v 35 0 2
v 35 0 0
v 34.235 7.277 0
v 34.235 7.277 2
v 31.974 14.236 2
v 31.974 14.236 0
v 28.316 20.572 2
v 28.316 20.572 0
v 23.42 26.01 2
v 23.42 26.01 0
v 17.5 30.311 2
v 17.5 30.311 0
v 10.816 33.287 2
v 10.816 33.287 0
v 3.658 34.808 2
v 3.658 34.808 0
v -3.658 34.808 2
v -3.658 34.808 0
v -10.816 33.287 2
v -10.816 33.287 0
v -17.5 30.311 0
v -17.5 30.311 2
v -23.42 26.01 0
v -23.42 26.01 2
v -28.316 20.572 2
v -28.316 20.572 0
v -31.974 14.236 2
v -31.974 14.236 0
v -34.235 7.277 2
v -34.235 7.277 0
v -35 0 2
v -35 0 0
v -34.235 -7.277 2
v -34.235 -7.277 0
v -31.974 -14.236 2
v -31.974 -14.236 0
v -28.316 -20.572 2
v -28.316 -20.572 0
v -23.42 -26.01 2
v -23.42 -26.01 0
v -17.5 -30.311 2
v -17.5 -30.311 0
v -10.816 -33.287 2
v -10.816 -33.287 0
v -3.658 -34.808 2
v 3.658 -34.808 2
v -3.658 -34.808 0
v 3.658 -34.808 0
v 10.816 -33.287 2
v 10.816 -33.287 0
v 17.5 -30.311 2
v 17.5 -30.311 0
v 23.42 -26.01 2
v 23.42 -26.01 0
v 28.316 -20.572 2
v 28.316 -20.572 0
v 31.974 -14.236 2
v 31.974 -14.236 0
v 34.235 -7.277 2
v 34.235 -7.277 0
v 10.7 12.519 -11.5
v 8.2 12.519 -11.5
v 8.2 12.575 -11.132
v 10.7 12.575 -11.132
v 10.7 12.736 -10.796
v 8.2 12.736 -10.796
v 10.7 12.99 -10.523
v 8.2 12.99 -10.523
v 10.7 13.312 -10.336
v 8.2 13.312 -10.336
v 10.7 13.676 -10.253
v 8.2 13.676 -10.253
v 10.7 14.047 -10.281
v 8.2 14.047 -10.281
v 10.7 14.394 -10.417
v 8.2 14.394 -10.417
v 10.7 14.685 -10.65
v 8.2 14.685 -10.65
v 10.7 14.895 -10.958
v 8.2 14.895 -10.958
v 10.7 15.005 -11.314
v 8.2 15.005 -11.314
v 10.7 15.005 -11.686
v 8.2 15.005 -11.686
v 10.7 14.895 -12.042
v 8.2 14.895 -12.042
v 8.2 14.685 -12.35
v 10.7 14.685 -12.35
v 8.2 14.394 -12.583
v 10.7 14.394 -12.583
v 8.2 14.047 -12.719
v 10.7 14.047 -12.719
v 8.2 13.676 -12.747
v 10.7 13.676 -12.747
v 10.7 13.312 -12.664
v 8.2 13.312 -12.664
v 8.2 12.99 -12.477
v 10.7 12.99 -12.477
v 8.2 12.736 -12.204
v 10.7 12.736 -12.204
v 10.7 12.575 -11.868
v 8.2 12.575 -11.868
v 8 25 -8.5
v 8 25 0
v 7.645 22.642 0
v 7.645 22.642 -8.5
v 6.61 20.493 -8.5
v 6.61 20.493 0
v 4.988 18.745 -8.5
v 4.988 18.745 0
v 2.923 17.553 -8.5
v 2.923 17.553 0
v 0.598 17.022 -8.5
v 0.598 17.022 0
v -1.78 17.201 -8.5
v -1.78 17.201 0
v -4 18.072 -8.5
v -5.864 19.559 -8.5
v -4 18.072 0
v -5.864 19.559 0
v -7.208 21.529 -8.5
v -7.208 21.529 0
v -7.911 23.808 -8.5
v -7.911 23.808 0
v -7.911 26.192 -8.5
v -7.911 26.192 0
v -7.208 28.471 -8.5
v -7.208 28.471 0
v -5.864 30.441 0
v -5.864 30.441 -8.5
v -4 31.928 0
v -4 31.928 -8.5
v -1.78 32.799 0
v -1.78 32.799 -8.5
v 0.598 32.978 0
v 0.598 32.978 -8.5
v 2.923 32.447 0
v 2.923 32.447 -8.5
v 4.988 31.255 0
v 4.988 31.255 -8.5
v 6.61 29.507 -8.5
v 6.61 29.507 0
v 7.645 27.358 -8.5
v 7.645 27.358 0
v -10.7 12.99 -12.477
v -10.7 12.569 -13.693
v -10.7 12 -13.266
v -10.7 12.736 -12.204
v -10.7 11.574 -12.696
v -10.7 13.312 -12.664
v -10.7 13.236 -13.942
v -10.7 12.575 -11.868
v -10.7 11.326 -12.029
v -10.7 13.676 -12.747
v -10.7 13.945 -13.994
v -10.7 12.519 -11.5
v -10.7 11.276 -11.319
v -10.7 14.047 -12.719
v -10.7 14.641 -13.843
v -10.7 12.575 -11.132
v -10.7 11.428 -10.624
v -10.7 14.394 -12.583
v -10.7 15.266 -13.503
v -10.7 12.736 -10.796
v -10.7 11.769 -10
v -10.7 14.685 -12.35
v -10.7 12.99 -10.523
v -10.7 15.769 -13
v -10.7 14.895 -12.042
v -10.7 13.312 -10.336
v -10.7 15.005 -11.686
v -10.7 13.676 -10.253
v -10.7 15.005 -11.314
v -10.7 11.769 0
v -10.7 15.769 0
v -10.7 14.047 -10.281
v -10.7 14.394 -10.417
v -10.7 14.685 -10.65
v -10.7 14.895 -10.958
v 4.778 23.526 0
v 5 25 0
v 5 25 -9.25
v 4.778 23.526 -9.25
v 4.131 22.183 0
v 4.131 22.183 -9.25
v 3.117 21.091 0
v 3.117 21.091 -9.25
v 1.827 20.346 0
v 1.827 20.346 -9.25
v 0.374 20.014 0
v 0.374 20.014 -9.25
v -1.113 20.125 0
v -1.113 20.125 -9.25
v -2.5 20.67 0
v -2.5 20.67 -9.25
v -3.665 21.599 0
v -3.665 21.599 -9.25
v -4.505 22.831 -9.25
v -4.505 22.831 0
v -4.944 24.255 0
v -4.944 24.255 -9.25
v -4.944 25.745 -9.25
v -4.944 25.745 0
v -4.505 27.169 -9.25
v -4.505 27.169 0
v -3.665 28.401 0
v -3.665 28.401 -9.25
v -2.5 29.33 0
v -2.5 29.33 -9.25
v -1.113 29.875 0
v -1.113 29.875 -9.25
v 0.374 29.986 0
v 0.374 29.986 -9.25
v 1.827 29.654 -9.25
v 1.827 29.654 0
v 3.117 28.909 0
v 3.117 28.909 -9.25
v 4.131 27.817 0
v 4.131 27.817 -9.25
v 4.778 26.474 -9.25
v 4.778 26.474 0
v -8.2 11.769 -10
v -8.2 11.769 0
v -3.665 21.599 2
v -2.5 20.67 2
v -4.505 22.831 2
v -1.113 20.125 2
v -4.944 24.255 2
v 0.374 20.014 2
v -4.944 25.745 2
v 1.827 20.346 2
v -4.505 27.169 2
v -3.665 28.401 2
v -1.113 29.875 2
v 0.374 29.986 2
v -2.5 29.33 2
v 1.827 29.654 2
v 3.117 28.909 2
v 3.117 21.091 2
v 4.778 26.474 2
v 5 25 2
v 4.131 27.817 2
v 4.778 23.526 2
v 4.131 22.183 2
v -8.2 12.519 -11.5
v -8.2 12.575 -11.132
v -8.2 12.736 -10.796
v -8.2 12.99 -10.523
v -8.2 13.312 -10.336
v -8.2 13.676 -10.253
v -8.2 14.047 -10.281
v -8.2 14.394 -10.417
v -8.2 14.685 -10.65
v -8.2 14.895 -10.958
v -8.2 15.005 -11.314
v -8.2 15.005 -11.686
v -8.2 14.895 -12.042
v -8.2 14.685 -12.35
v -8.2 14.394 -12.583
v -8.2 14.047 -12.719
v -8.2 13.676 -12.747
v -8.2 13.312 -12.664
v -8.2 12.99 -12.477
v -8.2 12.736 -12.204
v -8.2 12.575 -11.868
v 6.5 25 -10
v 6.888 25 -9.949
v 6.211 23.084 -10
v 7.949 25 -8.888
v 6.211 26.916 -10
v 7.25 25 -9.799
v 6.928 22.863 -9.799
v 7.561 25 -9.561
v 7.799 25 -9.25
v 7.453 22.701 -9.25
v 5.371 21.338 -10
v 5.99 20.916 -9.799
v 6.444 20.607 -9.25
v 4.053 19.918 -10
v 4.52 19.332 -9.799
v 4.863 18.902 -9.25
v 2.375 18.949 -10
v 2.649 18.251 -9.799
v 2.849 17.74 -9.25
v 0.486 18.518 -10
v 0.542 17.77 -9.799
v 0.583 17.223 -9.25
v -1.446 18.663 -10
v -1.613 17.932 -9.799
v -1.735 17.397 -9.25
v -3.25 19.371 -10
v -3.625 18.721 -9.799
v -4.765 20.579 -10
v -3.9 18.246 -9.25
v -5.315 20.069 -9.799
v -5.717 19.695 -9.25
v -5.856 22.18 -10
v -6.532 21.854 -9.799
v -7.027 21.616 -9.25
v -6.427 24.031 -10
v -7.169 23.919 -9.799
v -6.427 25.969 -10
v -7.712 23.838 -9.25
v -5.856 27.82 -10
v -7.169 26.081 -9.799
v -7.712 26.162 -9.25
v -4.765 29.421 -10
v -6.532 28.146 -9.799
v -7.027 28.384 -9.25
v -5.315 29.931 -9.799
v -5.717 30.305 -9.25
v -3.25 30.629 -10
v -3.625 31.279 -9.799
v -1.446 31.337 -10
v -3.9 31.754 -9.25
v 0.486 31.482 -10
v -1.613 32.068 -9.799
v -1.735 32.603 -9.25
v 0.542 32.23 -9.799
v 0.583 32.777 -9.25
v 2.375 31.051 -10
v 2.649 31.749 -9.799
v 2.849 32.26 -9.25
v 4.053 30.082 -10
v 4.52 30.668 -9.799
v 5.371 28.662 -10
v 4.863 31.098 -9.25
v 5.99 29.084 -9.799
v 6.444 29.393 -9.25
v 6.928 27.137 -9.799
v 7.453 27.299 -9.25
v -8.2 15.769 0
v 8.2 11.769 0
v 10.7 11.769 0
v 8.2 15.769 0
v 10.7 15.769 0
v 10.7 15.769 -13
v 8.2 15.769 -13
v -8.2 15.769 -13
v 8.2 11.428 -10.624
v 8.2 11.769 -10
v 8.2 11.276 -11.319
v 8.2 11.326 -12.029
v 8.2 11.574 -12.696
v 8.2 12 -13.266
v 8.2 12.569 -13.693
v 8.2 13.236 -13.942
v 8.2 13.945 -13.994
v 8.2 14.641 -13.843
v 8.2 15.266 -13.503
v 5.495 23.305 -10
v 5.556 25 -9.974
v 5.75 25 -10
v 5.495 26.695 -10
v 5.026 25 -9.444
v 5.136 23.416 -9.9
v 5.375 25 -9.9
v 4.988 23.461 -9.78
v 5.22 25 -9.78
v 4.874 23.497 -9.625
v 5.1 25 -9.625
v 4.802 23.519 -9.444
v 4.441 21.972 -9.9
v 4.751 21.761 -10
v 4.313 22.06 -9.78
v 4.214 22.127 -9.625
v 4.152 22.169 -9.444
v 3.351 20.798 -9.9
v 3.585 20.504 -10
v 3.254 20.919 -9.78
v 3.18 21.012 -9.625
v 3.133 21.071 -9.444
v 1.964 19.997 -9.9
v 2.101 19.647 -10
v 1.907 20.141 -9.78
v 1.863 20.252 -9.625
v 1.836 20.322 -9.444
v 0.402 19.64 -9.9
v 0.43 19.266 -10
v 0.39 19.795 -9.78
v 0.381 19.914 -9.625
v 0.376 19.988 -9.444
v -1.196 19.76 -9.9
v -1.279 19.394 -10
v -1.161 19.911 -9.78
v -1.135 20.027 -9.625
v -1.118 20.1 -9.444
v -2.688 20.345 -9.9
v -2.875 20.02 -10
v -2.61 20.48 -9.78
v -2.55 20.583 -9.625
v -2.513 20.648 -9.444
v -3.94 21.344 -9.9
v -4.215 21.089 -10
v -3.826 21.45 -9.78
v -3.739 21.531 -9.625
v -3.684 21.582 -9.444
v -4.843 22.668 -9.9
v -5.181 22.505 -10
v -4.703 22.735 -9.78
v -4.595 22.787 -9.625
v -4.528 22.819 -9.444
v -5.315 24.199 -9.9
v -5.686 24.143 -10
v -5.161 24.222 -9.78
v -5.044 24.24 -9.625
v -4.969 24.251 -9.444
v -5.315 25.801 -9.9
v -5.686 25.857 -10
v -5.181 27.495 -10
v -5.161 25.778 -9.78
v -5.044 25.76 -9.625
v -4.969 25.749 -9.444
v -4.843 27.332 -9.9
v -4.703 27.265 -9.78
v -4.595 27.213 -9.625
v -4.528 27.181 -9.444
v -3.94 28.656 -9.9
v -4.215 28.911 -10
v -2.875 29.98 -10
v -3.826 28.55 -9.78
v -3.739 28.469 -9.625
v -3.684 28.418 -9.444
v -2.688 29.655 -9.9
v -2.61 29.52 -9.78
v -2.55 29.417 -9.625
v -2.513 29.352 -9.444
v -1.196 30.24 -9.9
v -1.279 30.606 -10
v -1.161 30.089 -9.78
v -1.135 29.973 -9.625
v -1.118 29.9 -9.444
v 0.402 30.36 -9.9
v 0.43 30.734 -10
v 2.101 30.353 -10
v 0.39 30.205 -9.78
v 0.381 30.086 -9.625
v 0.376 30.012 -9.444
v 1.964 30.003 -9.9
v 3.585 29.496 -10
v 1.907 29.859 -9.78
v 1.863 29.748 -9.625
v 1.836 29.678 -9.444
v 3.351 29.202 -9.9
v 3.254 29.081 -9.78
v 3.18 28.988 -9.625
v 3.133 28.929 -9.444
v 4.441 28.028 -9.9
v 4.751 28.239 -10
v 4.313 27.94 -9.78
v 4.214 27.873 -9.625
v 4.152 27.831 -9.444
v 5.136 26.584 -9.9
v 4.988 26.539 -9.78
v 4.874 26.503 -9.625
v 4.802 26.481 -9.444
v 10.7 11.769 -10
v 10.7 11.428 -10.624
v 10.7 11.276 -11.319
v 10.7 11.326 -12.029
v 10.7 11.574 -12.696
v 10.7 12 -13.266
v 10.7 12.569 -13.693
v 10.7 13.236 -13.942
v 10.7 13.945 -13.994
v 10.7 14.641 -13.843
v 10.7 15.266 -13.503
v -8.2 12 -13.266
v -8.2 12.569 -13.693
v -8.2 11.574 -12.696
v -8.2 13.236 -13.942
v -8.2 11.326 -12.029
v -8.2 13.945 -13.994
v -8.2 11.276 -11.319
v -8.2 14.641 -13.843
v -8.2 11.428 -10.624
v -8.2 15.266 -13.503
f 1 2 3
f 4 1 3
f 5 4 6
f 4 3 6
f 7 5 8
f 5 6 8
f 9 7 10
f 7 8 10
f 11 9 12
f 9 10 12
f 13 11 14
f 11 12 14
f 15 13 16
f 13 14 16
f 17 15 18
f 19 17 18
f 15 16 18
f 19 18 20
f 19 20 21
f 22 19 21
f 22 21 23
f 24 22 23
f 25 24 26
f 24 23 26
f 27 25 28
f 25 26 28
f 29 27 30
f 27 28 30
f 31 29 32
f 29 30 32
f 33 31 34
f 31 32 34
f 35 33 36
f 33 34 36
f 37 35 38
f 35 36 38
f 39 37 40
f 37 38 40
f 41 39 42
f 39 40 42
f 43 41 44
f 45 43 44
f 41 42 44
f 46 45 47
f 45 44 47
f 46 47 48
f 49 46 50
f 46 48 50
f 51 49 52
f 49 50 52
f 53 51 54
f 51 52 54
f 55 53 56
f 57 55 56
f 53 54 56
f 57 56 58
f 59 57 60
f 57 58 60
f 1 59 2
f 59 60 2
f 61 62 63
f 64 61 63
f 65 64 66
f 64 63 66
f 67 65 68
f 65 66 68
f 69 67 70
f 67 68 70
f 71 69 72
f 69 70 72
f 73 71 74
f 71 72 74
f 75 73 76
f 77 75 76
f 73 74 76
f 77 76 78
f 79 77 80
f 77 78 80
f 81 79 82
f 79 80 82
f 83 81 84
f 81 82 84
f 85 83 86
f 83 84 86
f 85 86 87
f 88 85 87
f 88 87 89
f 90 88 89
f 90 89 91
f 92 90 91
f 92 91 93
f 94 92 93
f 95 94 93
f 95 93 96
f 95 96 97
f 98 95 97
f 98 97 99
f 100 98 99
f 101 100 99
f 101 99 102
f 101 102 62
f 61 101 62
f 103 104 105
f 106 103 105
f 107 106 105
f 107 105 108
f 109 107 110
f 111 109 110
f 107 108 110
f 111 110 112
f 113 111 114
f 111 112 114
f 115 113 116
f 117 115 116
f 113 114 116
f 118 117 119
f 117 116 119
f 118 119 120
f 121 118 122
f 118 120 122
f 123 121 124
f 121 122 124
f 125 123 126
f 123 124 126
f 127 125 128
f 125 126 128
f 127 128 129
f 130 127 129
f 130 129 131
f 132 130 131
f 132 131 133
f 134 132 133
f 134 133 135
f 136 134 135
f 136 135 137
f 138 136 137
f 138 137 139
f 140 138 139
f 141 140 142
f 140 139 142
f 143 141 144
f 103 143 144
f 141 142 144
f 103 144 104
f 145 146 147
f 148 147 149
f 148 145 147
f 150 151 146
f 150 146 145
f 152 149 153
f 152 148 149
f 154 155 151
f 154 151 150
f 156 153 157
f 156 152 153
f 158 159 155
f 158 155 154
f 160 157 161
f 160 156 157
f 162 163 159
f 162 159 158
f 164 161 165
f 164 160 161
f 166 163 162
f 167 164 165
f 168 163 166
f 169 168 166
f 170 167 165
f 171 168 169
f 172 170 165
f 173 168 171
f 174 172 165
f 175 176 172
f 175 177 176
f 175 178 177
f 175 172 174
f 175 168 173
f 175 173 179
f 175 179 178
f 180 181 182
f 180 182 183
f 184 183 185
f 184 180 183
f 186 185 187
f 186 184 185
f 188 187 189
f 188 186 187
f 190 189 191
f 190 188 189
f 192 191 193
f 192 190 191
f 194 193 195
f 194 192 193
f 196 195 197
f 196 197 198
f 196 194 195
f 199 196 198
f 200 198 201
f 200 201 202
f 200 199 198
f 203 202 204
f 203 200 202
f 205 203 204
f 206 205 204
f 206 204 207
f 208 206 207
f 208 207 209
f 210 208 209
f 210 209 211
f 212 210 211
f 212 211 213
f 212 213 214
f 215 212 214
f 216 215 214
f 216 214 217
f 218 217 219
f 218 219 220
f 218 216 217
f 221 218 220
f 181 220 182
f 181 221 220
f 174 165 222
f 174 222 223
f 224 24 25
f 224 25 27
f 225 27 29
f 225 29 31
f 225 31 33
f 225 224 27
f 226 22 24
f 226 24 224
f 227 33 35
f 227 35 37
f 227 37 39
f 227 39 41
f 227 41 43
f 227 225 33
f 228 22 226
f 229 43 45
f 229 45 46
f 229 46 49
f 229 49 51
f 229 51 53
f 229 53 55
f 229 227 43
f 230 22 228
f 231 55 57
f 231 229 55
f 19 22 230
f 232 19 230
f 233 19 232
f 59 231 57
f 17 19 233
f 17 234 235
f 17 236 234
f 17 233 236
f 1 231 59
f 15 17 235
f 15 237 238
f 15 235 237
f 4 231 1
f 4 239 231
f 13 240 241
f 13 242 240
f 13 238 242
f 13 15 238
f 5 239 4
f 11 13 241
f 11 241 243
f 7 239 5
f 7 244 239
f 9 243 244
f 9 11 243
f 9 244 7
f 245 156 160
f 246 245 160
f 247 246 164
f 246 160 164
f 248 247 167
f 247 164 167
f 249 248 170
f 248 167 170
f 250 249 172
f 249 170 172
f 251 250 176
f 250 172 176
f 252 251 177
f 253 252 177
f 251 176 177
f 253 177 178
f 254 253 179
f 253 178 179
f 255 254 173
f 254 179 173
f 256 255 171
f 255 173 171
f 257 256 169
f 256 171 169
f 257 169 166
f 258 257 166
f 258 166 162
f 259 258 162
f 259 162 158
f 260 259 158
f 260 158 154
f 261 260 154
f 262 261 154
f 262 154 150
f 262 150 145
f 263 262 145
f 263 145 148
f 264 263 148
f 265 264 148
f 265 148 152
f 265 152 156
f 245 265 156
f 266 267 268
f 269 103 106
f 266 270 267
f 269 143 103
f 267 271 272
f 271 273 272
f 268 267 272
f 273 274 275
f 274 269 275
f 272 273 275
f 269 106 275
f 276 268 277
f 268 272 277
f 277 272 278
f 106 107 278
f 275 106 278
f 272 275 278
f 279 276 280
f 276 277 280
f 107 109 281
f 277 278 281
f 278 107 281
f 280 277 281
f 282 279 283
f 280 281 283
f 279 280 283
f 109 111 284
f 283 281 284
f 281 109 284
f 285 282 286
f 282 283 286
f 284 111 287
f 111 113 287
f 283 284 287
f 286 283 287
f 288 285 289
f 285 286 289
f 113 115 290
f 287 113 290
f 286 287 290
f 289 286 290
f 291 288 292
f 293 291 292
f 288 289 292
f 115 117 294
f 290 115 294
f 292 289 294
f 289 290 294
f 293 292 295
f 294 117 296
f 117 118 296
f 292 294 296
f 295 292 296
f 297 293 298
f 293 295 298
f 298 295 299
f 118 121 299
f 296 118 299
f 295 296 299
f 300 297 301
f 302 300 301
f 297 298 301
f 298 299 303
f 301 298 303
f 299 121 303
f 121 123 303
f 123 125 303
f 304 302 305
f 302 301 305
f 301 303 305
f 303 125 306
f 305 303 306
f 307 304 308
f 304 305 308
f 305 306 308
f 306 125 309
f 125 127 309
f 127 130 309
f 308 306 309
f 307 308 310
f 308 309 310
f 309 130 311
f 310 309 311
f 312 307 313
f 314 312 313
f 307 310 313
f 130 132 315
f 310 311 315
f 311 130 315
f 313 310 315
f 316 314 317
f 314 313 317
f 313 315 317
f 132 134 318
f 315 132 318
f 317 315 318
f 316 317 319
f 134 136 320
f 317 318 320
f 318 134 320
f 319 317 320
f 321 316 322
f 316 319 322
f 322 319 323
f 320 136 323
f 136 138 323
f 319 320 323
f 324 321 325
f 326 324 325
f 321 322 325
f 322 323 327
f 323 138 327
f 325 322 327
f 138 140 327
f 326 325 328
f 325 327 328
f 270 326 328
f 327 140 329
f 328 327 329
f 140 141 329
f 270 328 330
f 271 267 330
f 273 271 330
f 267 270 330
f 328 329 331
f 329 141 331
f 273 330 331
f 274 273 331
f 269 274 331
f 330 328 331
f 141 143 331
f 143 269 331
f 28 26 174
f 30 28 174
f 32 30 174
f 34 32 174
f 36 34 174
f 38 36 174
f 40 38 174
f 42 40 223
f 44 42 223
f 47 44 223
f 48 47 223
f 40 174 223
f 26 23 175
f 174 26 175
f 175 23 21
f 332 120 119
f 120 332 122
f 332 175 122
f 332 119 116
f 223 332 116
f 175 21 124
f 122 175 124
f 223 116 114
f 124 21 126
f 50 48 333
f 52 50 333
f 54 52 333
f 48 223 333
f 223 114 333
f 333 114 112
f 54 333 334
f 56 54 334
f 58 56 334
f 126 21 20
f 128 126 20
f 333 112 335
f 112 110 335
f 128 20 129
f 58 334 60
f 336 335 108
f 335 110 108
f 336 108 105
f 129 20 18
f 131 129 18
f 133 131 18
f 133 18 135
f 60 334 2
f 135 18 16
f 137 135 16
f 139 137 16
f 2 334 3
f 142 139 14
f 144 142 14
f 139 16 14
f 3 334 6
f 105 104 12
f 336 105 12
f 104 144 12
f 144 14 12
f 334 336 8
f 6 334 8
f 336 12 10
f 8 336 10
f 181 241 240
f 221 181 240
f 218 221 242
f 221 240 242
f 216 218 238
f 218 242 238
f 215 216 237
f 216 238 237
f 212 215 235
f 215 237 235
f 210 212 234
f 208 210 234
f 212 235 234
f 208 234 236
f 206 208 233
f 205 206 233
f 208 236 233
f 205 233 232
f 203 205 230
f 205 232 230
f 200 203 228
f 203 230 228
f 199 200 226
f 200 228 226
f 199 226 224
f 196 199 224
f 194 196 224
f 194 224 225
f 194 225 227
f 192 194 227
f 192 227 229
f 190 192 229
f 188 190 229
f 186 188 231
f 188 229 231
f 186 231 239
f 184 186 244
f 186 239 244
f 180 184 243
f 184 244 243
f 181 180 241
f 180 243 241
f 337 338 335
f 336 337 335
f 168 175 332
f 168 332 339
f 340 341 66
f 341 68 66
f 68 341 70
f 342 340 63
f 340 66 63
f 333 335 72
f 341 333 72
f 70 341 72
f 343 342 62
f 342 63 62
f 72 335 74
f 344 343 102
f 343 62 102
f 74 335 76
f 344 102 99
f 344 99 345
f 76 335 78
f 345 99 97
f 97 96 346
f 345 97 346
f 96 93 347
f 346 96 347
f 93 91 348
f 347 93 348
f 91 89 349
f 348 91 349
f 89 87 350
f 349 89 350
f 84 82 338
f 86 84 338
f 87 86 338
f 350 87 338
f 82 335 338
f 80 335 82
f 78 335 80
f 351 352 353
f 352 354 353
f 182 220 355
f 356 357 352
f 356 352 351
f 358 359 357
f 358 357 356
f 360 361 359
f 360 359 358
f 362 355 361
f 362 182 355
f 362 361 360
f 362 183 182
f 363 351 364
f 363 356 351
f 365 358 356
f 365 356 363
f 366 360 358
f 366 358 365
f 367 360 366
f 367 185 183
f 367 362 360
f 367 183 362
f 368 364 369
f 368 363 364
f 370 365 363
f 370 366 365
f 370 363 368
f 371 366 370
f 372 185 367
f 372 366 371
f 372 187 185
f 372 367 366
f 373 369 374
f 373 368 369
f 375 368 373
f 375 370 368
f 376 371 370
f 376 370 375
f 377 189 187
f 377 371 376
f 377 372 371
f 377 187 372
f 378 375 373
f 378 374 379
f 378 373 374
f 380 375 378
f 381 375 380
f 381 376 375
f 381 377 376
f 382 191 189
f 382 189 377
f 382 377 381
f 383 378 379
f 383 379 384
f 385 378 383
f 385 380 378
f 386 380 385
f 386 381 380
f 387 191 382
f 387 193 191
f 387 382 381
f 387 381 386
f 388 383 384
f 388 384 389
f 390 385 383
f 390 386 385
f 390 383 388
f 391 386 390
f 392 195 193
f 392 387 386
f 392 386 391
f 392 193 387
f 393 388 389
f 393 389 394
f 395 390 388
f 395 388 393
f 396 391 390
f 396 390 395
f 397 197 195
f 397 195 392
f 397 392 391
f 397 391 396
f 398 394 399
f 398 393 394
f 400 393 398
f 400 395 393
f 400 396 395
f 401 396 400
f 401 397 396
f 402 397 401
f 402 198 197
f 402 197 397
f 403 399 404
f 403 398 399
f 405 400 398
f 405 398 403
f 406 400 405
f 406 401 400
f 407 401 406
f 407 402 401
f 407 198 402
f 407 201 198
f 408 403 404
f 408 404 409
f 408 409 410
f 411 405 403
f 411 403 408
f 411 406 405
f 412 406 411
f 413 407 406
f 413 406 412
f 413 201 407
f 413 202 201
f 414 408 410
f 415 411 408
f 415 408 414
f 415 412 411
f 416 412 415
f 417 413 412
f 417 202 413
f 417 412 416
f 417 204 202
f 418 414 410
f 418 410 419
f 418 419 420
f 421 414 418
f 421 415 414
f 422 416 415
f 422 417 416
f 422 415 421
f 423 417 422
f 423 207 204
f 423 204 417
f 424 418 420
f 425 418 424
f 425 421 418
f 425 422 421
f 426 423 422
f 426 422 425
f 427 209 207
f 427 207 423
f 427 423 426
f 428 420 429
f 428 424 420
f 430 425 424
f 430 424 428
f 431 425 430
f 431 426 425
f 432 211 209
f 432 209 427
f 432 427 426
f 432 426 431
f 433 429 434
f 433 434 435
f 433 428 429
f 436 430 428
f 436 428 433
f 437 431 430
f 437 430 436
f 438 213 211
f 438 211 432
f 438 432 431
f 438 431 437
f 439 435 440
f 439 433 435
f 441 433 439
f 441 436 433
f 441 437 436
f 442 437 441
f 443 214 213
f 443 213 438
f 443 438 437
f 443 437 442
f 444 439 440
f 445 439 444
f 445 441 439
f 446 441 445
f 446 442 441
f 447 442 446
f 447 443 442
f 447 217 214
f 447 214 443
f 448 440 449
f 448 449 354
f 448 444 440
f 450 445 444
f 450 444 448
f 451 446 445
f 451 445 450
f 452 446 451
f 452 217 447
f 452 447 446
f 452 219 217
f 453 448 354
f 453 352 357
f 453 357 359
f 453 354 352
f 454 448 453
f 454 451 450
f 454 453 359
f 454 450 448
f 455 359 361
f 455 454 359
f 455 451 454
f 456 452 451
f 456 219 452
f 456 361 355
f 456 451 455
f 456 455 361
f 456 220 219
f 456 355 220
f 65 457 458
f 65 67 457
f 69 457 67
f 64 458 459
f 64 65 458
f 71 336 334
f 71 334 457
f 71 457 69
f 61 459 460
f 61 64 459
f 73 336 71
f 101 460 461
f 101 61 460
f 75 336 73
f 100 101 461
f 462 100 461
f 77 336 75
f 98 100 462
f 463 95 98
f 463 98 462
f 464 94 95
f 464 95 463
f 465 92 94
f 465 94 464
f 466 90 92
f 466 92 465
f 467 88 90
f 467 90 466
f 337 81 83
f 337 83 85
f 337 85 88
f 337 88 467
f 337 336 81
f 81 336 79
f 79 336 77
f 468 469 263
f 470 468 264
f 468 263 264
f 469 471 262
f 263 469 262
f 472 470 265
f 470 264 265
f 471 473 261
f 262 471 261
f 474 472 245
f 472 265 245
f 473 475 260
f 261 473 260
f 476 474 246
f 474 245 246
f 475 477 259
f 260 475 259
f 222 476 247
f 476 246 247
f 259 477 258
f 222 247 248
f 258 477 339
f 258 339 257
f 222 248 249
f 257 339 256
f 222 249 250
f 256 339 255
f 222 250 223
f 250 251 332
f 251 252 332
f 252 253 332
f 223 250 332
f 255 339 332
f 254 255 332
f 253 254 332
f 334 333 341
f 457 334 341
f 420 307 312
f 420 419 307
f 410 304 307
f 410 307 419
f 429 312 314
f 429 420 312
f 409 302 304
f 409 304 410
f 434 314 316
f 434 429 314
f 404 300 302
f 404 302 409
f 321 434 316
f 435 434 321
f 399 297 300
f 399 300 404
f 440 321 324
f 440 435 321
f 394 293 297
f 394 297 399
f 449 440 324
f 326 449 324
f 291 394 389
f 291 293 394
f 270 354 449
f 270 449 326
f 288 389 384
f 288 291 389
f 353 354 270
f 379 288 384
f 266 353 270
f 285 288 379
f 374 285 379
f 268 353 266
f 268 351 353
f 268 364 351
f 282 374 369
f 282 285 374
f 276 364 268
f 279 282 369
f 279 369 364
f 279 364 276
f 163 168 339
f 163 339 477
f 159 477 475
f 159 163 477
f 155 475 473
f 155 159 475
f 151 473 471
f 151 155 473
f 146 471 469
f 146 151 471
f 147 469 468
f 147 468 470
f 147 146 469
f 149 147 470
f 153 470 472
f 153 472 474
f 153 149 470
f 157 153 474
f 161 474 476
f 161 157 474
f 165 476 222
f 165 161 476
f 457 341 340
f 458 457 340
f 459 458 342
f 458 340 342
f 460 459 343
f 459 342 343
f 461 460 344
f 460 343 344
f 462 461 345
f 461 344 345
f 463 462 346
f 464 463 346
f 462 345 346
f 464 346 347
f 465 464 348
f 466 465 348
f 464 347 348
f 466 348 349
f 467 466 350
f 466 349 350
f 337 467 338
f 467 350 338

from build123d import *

# Parameters (mm, degrees)
SKETCH1_R           = 35
BOSS_EXTRUDE1_DEPTH = 2
SKETCH2_R           = 5
CUT_EXTRUDE2_DEPTH  = 2
SKETCH4_R           = 8
SKETCH4_R_2         = 5
BOSS_EXTRUDE3_DEPTH = 10
FILLET3_R           = 0.75
FILLET4_R           = 1.5
BOSS_EXTRUDE4_START = 0.2
BOSS_EXTRUDE4_DEPTH = 2.5
BOSS_EXTRUDE5_START = 2.7
BOSS_EXTRUDE5_DEPTH = 2.5
SKETCH7_R           = 1.25
CUT_EXTRUDE3_DEPTH  = 60.240948676


with BuildPart() as part:
    # Sketch1 → Boss-Extrude1 (new body)
    with BuildSketch(Plane.XY):
        Circle(SKETCH1_R)
    extrude(amount=BOSS_EXTRUDE1_DEPTH)

    # Sketch2 → Cut-Extrude2 (cut)
    with BuildSketch(Plane.XY.offset(2)):
        with Locations((0, 25)):
            Circle(SKETCH2_R)
    extrude(amount=-CUT_EXTRUDE2_DEPTH, mode=Mode.SUBTRACT)

    # Sketch4 → Boss-Extrude3 (add)
    with BuildSketch(Plane(origin=(0, 0, 0), x_dir=(-1, 0, 0), z_dir=(0, 0, -1))):
        with Locations(Location((0, 25, 0), (0, 0, 180))):
            Circle(SKETCH4_R)
        with Locations(Location((0, 25, 0), (0, 0, 180))):
            Circle(SKETCH4_R_2, mode=Mode.SUBTRACT)
    extrude(amount=BOSS_EXTRUDE3_DEPTH)

    # Fillet3
    fillet3_edges = [part.edges().sort_by_distance(p)[0] for p in [
        (-5, 25, -10),
    ]]
    fillet(fillet3_edges, radius=FILLET3_R)

    # Fillet4
    fillet4_edges = [part.edges().sort_by_distance(p)[0] for p in [
        (-8, 25, -10),
    ]]
    fillet(fillet4_edges, radius=FILLET4_R)

    # Sketch5 → Boss-Extrude4 (add)
    with BuildSketch(Plane(origin=(8, 0, 0), x_dir=(0, 0, -1), z_dir=(1, 0, 0)).offset(BOSS_EXTRUDE4_START)):
        with BuildLine():
            Line((13, 15.769174864), (0, 15.769174864))
            Line((0, 15.769174864), (0, 11.769174864))
            Line((0, 11.769174864), (10, 11.769174864))
            ThreePointArc((10, 11.769174864), (13.5, 12.269174864), (13, 15.769174864))
        make_face()
    extrude(amount=BOSS_EXTRUDE4_DEPTH)

    # Sketch6 → Boss-Extrude5 (add)
    with BuildSketch(Plane.ZY.offset(8).offset(BOSS_EXTRUDE5_START)):
        with BuildLine():
            Line((-10, 11.769174864), (0, 11.769174864))
            Line((0, 11.769174864), (0, 15.769174864))
            Line((0, 15.769174864), (-13, 15.769174864))
            ThreePointArc((-13, 15.769174864), (-13.5, 12.269174864), (-10, 11.769174864))
        make_face()
    extrude(amount=-BOSS_EXTRUDE5_DEPTH)

    # Sketch7 → Cut-Extrude3 (cut, through all)
    with BuildSketch(Plane.ZY.offset(10.7)):
        with Locations(Location((-11.5, 13.769174864, 0), (0, 0, 270))):
            Circle(SKETCH7_R)
    extrude(amount=-CUT_EXTRUDE3_DEPTH, mode=Mode.SUBTRACT)


solid = part.part
